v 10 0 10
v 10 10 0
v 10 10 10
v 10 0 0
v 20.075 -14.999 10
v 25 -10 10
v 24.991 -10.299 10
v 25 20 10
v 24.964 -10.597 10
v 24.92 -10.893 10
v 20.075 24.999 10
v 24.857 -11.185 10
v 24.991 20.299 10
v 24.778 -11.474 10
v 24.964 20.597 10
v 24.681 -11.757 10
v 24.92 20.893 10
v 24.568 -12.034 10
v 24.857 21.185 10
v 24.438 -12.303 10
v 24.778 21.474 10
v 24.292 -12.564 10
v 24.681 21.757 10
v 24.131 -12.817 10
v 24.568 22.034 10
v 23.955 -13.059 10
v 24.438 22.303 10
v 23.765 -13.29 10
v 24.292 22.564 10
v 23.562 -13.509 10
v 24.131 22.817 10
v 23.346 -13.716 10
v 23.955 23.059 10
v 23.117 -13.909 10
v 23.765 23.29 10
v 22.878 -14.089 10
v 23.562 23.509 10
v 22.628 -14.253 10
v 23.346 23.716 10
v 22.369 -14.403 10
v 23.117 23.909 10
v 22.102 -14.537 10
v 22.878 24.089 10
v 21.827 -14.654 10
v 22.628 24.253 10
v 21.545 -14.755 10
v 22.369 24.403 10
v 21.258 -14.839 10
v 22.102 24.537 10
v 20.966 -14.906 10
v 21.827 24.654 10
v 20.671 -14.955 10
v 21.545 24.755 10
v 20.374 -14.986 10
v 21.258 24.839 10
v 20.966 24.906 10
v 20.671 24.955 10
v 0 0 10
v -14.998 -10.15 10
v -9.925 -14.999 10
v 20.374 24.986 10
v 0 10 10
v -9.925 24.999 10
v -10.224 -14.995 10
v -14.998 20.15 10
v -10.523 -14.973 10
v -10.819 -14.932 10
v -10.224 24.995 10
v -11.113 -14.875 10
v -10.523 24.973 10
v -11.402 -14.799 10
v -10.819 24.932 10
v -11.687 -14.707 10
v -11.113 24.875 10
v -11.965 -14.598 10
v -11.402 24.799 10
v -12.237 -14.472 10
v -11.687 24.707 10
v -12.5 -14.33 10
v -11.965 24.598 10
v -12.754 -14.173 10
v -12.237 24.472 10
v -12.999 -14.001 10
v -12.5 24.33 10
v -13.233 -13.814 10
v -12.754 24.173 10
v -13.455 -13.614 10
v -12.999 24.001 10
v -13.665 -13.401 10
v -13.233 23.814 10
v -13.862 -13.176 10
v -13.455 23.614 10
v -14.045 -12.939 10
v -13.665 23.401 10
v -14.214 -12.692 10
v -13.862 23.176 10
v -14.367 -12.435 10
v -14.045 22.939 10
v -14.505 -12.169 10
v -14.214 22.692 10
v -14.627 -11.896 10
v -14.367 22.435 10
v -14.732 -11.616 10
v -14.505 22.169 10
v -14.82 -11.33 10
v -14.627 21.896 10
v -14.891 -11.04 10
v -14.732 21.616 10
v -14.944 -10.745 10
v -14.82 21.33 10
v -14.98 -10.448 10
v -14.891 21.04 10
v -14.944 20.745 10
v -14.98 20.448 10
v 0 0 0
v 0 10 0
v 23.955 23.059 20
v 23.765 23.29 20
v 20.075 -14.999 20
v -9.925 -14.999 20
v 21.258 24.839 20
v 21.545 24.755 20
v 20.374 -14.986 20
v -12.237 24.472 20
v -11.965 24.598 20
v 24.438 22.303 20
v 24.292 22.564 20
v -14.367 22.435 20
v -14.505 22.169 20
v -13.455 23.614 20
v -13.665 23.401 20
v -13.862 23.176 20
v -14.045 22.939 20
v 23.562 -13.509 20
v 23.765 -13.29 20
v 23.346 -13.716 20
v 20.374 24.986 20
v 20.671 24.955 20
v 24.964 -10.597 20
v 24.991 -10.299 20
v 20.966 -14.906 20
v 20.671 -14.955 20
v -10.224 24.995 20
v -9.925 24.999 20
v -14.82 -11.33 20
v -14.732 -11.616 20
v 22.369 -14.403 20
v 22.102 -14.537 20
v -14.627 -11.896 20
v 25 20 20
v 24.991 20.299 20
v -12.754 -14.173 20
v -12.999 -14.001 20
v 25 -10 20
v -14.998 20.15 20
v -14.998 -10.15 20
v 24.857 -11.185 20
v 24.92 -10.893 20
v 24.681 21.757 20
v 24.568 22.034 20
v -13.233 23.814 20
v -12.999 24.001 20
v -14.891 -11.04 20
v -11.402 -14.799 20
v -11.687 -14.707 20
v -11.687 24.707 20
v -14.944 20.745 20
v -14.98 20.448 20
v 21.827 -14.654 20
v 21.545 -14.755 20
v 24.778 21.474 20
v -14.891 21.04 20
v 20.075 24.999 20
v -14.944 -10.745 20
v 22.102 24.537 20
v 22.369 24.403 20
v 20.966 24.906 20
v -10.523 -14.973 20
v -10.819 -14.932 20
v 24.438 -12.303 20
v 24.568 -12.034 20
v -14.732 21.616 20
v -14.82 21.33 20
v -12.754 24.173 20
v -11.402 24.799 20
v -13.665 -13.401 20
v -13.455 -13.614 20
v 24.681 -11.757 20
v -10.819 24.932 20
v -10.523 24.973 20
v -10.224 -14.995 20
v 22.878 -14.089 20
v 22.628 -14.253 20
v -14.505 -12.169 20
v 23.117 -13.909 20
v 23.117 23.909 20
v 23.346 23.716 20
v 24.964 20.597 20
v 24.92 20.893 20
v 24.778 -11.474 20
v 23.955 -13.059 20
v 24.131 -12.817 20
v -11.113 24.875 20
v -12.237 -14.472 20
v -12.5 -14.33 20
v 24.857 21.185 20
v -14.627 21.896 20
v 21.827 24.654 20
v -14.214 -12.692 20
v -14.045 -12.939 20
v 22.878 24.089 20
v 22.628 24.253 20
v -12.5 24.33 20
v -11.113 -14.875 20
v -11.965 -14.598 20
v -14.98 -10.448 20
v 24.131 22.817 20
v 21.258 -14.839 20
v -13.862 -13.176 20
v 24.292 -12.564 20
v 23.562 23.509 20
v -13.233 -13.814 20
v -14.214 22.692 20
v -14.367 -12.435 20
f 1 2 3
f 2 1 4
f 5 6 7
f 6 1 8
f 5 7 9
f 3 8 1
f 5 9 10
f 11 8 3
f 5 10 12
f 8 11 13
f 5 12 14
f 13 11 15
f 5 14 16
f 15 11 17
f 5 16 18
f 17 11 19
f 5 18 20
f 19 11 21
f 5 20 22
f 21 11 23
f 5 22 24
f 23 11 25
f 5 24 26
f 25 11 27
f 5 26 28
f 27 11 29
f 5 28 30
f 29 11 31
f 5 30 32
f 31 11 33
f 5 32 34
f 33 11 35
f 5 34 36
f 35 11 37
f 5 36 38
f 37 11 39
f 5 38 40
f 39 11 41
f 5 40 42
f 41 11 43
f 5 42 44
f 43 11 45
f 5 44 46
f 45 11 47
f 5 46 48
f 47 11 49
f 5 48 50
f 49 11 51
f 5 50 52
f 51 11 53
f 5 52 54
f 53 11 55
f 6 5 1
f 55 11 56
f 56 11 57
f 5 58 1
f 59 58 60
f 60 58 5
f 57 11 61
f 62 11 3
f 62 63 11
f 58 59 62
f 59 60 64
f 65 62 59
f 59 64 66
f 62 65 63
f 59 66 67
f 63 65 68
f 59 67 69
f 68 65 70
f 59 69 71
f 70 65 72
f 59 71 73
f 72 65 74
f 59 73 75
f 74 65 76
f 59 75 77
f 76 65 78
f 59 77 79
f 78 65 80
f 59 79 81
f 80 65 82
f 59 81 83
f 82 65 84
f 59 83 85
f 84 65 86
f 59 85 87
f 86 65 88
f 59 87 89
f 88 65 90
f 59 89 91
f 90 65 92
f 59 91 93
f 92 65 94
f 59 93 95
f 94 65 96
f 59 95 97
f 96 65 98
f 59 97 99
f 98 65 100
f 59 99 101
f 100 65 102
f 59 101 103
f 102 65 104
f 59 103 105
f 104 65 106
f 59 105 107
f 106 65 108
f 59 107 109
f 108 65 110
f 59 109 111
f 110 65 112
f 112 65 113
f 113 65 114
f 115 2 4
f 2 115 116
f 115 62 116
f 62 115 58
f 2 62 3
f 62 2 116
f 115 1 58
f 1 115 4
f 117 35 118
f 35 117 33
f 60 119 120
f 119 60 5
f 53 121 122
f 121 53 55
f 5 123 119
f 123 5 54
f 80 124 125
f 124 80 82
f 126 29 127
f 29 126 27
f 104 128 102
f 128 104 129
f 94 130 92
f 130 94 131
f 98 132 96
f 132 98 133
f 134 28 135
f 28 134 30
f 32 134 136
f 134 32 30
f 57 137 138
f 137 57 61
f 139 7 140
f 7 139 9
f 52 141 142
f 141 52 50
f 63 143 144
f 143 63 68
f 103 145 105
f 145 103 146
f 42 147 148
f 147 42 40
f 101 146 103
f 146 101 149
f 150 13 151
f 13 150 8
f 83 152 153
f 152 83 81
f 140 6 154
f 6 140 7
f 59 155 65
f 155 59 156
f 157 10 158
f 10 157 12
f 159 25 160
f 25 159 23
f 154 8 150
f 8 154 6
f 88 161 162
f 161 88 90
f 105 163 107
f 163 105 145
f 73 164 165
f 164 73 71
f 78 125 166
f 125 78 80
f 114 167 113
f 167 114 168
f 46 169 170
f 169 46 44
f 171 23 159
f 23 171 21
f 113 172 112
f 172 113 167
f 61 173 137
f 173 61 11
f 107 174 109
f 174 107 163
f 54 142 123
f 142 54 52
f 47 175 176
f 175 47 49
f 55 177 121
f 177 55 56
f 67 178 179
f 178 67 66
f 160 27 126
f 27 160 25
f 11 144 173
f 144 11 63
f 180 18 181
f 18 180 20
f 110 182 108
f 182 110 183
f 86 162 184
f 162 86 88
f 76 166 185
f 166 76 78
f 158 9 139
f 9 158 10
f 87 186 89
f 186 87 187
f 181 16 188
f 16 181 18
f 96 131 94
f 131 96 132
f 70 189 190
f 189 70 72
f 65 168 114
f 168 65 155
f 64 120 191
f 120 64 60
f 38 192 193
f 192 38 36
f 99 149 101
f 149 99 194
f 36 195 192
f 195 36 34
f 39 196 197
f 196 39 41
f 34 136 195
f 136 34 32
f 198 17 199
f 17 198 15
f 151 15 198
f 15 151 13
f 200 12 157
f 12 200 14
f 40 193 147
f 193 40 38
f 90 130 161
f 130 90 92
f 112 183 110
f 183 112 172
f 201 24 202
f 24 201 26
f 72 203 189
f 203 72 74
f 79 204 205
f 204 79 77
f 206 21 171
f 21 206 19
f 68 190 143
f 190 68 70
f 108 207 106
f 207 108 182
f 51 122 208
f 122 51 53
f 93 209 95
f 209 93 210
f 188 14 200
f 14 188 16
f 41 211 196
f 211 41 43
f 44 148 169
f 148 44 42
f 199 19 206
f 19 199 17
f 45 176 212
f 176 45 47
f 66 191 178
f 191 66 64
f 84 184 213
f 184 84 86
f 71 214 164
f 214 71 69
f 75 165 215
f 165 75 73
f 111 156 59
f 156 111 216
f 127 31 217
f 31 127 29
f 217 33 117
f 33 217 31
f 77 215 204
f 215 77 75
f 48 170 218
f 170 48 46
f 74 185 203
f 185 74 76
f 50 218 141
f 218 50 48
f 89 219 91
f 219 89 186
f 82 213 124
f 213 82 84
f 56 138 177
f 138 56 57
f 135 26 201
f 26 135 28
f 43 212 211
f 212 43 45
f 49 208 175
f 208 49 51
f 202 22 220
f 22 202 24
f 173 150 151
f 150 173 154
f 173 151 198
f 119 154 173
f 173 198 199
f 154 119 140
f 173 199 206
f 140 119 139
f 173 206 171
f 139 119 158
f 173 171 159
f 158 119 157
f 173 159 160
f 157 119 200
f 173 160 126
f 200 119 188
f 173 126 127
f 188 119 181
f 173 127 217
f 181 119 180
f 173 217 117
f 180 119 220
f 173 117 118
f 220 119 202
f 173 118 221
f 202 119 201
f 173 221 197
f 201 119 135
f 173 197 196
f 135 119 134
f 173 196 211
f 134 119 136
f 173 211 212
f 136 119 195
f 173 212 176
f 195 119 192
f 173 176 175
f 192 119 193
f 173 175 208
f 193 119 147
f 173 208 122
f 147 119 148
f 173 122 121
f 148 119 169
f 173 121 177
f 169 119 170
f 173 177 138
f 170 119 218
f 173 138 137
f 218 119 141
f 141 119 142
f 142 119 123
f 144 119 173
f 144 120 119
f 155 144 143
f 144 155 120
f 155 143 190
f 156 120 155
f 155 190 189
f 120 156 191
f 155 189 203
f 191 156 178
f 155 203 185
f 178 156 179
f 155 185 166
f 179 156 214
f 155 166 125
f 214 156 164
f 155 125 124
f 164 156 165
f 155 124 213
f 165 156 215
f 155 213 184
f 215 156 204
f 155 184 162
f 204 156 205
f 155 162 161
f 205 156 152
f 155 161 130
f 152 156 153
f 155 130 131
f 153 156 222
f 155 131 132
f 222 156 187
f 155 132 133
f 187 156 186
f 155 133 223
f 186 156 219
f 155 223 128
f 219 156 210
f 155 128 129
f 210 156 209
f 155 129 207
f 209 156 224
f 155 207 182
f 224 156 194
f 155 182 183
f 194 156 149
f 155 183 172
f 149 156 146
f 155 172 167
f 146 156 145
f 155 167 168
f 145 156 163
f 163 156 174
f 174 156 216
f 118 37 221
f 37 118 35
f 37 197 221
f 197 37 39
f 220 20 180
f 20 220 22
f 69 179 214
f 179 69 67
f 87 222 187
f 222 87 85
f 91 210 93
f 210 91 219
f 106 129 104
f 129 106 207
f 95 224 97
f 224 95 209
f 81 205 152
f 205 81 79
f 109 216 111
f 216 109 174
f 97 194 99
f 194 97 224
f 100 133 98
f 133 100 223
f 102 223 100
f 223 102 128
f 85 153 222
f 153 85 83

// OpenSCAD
$fs = 0.3;
$fa = 1;

cube(10);
translate([-10, -10, 10]) {
	minkowski() {
		cube([30, 30, 9]);
		cylinder(r=5, h=1);
	}
}
